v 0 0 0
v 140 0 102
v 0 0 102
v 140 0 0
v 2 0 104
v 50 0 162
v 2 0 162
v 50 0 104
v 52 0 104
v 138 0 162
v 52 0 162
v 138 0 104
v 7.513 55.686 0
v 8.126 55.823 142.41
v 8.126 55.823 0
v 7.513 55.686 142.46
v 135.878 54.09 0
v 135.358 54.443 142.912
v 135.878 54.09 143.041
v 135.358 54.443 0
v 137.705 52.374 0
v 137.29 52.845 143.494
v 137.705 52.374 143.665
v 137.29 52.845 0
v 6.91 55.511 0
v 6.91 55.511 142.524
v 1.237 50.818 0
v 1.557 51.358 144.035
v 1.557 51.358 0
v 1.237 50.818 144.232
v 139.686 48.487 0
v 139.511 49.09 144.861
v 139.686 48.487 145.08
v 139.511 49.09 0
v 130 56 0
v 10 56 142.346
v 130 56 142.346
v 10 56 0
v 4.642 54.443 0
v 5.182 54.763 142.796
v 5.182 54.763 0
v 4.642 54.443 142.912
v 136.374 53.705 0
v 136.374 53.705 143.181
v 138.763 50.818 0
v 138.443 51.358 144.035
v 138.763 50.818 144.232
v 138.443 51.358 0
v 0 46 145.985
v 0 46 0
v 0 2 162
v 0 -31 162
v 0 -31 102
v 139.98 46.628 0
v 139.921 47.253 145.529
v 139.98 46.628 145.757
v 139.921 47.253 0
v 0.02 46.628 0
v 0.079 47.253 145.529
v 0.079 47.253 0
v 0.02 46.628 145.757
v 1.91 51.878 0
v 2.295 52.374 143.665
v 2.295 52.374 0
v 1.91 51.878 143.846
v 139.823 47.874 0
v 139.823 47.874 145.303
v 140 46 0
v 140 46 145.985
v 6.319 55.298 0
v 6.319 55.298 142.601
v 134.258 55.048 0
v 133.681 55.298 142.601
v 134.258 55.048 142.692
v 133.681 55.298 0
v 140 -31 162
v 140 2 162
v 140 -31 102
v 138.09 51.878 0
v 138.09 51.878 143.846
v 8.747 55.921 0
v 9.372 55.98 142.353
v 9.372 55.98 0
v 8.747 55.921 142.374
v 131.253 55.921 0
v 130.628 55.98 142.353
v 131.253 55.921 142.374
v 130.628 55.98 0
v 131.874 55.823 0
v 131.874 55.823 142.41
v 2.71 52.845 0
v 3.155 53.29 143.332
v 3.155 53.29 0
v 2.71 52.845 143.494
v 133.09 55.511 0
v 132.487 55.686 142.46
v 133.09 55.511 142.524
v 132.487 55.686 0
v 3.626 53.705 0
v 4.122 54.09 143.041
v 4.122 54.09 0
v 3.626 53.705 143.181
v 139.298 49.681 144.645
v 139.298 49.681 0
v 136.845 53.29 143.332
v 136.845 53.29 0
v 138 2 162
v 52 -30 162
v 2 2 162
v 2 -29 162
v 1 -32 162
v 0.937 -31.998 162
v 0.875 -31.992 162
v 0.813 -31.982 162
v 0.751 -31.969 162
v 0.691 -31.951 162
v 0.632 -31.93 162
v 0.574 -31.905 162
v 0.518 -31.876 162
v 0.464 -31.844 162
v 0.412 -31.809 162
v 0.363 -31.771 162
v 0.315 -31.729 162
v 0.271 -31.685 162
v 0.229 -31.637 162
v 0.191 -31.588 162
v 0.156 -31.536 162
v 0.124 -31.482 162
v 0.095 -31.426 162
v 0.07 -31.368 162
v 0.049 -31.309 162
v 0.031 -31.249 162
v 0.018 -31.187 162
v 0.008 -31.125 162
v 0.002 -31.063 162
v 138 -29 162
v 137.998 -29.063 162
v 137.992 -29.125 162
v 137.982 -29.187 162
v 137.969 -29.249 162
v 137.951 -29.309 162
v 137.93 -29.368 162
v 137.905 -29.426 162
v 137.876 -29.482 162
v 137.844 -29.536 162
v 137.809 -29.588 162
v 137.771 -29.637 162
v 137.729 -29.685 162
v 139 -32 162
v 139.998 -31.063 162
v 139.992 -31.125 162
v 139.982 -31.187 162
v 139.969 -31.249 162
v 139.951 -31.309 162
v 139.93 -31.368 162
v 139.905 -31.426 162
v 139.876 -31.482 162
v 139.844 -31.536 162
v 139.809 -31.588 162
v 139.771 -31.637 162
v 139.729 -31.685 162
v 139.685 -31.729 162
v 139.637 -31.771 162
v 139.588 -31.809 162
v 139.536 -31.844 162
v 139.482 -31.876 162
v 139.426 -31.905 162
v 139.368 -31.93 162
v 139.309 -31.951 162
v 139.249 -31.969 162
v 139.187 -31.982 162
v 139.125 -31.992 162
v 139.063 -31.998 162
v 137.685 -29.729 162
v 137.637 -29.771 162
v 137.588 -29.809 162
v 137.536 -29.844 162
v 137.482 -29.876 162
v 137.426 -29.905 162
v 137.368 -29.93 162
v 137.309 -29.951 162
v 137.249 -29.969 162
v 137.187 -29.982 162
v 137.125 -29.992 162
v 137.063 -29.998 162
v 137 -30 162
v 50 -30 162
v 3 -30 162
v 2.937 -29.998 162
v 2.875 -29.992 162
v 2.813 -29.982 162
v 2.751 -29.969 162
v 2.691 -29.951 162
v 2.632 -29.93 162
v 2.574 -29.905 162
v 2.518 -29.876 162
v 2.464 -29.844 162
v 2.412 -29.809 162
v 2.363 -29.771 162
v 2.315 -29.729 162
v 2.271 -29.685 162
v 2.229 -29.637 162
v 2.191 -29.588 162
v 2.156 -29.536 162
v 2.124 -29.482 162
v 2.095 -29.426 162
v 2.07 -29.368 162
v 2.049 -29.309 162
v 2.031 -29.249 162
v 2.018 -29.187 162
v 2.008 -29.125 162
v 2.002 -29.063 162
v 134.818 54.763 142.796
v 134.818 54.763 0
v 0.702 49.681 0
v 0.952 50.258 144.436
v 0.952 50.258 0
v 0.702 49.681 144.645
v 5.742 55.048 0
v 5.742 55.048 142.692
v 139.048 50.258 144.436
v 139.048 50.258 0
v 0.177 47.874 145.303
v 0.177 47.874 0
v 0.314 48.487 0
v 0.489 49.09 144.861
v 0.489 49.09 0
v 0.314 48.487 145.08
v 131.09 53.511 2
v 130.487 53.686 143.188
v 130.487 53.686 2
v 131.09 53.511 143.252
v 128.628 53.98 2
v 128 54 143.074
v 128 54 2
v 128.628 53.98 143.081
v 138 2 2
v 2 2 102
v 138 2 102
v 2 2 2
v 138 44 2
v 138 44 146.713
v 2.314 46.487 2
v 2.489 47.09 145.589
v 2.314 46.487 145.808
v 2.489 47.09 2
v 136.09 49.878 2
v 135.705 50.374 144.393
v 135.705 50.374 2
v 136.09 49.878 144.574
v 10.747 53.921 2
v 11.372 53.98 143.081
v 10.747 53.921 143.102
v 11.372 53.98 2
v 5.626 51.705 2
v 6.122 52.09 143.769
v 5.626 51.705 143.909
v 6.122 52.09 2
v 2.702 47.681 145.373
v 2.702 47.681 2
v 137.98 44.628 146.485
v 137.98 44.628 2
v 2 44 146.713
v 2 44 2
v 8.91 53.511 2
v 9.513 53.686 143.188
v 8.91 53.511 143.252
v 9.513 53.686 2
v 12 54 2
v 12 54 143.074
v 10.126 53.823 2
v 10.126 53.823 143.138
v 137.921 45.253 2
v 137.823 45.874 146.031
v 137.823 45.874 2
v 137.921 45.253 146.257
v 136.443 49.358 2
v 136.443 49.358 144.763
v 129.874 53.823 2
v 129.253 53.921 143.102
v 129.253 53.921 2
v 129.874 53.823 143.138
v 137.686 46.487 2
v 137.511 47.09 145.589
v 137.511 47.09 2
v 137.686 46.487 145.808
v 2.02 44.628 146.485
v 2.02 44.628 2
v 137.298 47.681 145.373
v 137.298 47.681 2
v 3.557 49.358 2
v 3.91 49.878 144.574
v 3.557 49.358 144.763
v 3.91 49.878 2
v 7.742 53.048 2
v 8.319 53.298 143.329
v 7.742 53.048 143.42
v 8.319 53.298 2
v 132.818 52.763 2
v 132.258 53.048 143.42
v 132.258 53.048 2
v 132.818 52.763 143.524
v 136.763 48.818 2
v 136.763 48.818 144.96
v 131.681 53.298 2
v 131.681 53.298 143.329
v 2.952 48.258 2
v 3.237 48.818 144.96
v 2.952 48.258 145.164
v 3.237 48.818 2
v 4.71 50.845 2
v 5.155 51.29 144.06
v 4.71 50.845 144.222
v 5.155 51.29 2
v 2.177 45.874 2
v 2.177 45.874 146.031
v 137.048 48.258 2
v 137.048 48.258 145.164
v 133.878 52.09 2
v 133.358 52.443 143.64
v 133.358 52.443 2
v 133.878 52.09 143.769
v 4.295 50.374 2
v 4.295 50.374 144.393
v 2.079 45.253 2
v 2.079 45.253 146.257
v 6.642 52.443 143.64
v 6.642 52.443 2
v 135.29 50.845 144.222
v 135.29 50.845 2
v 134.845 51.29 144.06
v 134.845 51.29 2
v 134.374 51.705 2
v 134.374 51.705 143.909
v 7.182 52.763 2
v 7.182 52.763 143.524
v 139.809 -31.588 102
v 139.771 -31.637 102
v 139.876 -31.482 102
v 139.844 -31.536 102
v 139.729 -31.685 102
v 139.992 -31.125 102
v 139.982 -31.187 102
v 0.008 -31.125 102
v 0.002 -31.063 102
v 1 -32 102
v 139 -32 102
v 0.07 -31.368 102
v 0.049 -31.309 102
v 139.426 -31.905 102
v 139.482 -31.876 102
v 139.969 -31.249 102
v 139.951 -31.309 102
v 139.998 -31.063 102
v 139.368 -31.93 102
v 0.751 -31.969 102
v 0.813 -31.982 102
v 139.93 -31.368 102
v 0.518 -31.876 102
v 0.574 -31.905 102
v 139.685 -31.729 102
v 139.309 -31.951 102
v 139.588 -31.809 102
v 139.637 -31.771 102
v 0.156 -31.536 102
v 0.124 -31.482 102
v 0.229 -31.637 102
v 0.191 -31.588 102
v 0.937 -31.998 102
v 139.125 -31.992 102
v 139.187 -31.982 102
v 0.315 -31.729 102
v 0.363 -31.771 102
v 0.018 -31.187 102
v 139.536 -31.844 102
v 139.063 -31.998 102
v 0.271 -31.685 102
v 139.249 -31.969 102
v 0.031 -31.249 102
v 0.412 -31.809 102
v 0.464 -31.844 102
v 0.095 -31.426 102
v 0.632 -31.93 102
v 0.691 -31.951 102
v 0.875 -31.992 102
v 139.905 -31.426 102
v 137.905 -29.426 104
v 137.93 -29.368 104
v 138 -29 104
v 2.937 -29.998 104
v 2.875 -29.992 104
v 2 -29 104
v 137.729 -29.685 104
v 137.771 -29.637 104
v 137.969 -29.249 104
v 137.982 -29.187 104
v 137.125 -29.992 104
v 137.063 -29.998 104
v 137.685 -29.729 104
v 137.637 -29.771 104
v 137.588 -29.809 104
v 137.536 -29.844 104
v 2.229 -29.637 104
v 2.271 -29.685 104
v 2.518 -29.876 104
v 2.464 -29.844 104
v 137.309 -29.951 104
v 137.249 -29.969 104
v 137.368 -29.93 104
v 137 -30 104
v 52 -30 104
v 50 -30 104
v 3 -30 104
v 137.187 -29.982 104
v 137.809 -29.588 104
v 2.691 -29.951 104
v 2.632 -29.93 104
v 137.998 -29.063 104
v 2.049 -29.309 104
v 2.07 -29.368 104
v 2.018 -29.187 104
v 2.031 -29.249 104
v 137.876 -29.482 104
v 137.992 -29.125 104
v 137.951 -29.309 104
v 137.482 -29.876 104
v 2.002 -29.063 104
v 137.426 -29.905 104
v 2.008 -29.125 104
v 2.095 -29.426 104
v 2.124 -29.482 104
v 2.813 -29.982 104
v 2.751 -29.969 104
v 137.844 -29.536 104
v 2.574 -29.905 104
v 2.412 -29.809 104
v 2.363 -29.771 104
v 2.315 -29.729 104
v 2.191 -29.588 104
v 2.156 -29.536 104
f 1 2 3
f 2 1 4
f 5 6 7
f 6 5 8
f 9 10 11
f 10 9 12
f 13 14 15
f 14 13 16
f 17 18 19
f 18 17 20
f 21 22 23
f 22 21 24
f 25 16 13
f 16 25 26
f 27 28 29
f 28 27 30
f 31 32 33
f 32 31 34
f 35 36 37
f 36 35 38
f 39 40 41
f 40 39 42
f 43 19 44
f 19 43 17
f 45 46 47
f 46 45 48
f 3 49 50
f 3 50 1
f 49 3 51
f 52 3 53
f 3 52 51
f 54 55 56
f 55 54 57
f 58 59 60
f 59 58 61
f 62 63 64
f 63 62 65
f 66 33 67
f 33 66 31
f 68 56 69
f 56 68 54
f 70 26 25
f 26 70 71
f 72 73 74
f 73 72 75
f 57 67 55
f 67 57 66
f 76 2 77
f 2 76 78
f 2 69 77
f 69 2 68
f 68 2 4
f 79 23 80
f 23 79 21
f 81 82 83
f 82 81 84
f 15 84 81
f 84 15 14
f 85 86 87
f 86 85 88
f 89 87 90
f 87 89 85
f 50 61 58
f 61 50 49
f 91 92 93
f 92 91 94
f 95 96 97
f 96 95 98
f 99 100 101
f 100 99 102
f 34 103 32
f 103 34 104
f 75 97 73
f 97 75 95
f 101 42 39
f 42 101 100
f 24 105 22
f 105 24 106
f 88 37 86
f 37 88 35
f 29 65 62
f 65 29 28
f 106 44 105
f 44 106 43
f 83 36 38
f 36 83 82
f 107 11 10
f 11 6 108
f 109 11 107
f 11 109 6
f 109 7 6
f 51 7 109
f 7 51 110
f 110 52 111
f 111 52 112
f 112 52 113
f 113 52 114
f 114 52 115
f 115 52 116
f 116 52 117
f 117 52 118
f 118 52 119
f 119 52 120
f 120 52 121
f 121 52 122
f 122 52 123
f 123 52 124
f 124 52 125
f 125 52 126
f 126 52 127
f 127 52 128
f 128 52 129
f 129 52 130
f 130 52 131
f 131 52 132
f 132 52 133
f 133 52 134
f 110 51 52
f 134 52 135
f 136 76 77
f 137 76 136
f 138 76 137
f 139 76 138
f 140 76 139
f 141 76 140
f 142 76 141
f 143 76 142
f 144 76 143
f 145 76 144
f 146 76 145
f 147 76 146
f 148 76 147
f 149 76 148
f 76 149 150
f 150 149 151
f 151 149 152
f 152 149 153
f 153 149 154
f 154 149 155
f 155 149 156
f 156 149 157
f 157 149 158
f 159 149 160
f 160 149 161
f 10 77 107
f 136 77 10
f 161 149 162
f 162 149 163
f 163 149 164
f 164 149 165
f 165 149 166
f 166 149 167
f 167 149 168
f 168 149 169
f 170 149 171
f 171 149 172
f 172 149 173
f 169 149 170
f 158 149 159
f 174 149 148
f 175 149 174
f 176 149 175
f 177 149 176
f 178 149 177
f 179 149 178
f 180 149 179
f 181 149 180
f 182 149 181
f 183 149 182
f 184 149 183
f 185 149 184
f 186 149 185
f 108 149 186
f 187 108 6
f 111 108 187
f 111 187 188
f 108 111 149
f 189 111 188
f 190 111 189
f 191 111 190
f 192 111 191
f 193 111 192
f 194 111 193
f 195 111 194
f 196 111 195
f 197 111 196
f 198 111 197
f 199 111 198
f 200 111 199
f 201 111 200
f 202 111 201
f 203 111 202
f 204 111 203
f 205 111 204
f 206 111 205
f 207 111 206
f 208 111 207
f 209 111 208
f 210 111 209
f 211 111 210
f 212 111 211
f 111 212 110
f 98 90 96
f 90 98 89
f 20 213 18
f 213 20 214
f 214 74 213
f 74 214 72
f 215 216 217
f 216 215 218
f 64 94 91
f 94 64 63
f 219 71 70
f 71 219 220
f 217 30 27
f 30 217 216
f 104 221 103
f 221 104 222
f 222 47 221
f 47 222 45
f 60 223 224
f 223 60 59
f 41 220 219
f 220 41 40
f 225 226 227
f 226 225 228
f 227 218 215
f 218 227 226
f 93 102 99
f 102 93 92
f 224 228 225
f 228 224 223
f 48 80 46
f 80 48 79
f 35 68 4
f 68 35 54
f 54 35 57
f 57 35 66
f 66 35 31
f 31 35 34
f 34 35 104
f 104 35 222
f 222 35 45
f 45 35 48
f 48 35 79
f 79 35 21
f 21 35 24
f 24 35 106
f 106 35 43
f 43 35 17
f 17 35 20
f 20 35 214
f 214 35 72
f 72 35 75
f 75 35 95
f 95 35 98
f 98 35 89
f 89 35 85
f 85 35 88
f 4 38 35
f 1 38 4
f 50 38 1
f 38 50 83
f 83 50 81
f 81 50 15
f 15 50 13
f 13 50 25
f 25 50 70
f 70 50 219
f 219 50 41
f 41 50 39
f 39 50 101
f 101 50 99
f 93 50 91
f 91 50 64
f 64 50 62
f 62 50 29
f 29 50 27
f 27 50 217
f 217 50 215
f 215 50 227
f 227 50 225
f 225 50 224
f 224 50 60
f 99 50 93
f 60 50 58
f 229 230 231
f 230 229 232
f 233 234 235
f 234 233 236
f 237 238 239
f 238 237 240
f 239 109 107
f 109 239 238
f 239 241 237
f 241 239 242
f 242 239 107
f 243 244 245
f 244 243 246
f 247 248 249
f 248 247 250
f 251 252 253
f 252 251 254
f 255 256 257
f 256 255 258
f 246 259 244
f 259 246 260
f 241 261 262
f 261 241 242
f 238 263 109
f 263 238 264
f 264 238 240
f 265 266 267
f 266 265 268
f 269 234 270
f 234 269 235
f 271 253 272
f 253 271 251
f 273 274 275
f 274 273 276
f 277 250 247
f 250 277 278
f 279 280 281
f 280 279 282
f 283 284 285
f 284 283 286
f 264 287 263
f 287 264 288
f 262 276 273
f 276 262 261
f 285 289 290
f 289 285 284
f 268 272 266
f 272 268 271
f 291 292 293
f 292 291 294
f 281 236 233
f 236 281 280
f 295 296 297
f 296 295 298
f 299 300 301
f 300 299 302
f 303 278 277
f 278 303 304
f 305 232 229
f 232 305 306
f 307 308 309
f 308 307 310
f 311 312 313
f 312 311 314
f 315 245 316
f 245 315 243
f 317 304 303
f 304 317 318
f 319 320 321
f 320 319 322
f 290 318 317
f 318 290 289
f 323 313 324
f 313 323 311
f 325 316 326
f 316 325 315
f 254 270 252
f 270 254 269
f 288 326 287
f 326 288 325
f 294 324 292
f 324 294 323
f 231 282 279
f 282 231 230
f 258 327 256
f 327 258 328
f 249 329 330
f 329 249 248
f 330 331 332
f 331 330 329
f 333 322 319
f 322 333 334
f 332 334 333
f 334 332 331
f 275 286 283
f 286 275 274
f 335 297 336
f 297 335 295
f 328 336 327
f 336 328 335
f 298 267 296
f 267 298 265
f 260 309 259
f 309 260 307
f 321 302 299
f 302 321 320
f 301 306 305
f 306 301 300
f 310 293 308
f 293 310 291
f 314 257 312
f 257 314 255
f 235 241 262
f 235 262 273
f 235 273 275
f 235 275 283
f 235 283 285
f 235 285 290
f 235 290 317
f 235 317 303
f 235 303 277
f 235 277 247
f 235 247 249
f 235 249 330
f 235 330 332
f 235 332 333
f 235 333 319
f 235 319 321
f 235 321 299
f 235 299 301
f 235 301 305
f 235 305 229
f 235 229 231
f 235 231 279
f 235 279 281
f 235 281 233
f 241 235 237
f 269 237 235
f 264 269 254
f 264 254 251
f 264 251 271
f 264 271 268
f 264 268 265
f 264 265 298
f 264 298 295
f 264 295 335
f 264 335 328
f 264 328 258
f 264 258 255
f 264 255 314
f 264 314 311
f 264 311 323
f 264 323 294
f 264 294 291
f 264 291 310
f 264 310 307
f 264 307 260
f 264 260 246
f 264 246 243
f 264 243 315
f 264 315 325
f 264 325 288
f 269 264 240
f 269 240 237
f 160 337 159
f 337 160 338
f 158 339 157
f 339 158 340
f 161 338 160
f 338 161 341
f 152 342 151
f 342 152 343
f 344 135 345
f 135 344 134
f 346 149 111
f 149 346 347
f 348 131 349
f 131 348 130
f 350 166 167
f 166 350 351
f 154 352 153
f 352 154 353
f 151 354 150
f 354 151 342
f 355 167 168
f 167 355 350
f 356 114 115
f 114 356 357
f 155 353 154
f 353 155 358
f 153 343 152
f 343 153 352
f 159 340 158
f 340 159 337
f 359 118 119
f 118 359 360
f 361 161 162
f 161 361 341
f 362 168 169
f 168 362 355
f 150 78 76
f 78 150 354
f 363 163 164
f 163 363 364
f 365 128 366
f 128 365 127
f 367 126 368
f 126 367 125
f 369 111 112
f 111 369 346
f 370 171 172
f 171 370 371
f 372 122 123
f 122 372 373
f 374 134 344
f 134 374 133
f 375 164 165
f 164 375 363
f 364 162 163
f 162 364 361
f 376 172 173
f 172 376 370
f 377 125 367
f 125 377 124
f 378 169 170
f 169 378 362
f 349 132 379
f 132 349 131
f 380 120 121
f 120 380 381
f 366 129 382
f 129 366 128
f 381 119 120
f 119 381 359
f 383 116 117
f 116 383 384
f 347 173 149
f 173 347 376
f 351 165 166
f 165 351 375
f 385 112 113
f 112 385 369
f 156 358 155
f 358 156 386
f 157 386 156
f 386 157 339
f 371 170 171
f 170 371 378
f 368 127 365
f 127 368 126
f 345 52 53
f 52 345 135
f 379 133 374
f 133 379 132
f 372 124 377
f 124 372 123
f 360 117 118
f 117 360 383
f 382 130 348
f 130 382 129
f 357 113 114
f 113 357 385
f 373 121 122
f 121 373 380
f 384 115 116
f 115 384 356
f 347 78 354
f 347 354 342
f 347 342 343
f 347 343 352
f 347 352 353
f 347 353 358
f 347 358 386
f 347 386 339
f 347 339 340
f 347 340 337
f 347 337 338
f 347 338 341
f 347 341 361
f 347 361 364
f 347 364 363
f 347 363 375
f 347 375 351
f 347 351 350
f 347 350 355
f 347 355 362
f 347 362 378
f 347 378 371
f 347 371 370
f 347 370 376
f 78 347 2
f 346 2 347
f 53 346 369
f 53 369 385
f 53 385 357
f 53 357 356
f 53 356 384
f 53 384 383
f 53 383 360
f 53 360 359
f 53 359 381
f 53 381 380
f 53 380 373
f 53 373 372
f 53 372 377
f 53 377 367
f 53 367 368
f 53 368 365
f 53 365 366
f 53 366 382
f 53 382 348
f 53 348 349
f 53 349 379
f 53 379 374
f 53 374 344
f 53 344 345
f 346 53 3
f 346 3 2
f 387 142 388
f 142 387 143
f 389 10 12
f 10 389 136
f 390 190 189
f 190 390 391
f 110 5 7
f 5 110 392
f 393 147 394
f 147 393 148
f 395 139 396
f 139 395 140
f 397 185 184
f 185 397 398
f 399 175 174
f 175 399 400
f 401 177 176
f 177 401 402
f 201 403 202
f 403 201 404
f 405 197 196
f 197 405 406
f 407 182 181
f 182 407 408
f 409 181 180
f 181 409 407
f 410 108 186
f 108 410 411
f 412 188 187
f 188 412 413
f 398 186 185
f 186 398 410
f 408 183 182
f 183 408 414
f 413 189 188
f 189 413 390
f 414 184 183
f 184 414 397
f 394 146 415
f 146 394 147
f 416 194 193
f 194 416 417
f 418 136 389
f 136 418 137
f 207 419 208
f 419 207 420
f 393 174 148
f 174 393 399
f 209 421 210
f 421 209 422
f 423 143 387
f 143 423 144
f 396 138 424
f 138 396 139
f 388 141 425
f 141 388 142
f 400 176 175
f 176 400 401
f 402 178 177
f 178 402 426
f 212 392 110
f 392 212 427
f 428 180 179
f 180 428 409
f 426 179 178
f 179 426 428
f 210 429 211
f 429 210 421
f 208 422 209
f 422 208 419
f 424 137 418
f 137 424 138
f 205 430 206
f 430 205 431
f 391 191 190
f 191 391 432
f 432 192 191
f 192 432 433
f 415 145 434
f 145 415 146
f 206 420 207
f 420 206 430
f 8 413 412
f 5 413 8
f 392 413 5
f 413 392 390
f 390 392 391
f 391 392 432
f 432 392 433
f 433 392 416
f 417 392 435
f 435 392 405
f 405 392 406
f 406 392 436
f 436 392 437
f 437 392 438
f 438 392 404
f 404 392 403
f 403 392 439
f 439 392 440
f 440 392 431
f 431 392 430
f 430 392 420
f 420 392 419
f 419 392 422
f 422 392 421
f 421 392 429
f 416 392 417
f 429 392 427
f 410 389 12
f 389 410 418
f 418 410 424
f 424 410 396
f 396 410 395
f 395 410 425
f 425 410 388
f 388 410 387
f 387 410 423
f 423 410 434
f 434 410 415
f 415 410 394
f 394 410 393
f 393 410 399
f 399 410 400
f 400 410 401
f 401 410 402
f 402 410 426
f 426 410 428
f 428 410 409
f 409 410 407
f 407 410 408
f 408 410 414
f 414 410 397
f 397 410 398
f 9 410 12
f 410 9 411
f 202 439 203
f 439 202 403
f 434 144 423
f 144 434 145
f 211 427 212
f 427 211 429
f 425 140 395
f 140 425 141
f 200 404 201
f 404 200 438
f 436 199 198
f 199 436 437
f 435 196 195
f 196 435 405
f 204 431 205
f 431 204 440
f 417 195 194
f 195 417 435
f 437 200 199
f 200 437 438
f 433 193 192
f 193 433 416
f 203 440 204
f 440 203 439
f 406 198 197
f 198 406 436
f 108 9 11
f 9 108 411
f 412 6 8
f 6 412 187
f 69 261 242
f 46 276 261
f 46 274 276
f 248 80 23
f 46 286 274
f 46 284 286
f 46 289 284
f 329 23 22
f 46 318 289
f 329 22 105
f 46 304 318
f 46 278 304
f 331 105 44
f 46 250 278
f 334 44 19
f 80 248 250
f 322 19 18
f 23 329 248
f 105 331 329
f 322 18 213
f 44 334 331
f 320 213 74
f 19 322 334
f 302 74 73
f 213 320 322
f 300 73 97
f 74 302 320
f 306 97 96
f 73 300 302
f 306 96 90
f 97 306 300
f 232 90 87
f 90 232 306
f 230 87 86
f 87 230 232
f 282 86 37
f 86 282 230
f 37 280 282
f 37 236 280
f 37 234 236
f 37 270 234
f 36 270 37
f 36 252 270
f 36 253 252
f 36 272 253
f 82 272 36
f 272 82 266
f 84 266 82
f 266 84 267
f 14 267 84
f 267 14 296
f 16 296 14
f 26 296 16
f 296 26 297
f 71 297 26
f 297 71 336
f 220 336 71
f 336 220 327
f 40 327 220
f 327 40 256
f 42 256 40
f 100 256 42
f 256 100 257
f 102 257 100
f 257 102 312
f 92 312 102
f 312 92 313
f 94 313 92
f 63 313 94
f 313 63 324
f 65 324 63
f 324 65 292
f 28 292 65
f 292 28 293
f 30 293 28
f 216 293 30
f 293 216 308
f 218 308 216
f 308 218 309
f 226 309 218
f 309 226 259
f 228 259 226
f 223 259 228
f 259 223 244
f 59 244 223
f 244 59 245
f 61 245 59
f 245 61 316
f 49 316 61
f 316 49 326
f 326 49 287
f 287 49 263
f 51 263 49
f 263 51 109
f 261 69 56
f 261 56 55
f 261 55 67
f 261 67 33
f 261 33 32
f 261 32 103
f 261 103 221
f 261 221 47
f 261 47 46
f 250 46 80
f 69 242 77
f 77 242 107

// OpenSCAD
// Copyright (C) 2020, Vishal Verma
// SPDX-License-Identifier: GPL-2.0-only

$fn=100;

len = 140;
hbase = 102;
htop = 60;
wall = 2;
box_y = 32 + wall;
wid = 90 - box_y;
radius = 10;

htot = hbase + htop;

module curve_box(x, y, h, r, w)
{
    difference() {
        hull() {
            cube([x, 10, h]);
            translate([r, y-r, 0]) cylinder(r=r, h=h);
            translate([x-r, y-r, 0]) cylinder(r=r, h=h);
        }
            hull() {
                translate([w, w, w]) cube([x-(2*w), 10, h]);
                translate([r+w, y-r-w, w]) cylinder(r=r, h=h);
                translate([x-r-w, y-r-w, w]) cylinder(r=r, h=h);
        }
    }
}

difference() {
    union() {
        curve_box(len, wid, htot, radius, wall);
        translate([len, wall, hbase])
            rotate([0, 0, 180])
                curve_box(len, box_y, htop, 1, wall);
        translate([50, -box_y + wall, hbase])
            cube([wall, box_y - wall, htop]);
    }
    translate([-1, wall, htot])
        rotate([-20, 0, 0])
            cube([len + 2, len, len]);
}
